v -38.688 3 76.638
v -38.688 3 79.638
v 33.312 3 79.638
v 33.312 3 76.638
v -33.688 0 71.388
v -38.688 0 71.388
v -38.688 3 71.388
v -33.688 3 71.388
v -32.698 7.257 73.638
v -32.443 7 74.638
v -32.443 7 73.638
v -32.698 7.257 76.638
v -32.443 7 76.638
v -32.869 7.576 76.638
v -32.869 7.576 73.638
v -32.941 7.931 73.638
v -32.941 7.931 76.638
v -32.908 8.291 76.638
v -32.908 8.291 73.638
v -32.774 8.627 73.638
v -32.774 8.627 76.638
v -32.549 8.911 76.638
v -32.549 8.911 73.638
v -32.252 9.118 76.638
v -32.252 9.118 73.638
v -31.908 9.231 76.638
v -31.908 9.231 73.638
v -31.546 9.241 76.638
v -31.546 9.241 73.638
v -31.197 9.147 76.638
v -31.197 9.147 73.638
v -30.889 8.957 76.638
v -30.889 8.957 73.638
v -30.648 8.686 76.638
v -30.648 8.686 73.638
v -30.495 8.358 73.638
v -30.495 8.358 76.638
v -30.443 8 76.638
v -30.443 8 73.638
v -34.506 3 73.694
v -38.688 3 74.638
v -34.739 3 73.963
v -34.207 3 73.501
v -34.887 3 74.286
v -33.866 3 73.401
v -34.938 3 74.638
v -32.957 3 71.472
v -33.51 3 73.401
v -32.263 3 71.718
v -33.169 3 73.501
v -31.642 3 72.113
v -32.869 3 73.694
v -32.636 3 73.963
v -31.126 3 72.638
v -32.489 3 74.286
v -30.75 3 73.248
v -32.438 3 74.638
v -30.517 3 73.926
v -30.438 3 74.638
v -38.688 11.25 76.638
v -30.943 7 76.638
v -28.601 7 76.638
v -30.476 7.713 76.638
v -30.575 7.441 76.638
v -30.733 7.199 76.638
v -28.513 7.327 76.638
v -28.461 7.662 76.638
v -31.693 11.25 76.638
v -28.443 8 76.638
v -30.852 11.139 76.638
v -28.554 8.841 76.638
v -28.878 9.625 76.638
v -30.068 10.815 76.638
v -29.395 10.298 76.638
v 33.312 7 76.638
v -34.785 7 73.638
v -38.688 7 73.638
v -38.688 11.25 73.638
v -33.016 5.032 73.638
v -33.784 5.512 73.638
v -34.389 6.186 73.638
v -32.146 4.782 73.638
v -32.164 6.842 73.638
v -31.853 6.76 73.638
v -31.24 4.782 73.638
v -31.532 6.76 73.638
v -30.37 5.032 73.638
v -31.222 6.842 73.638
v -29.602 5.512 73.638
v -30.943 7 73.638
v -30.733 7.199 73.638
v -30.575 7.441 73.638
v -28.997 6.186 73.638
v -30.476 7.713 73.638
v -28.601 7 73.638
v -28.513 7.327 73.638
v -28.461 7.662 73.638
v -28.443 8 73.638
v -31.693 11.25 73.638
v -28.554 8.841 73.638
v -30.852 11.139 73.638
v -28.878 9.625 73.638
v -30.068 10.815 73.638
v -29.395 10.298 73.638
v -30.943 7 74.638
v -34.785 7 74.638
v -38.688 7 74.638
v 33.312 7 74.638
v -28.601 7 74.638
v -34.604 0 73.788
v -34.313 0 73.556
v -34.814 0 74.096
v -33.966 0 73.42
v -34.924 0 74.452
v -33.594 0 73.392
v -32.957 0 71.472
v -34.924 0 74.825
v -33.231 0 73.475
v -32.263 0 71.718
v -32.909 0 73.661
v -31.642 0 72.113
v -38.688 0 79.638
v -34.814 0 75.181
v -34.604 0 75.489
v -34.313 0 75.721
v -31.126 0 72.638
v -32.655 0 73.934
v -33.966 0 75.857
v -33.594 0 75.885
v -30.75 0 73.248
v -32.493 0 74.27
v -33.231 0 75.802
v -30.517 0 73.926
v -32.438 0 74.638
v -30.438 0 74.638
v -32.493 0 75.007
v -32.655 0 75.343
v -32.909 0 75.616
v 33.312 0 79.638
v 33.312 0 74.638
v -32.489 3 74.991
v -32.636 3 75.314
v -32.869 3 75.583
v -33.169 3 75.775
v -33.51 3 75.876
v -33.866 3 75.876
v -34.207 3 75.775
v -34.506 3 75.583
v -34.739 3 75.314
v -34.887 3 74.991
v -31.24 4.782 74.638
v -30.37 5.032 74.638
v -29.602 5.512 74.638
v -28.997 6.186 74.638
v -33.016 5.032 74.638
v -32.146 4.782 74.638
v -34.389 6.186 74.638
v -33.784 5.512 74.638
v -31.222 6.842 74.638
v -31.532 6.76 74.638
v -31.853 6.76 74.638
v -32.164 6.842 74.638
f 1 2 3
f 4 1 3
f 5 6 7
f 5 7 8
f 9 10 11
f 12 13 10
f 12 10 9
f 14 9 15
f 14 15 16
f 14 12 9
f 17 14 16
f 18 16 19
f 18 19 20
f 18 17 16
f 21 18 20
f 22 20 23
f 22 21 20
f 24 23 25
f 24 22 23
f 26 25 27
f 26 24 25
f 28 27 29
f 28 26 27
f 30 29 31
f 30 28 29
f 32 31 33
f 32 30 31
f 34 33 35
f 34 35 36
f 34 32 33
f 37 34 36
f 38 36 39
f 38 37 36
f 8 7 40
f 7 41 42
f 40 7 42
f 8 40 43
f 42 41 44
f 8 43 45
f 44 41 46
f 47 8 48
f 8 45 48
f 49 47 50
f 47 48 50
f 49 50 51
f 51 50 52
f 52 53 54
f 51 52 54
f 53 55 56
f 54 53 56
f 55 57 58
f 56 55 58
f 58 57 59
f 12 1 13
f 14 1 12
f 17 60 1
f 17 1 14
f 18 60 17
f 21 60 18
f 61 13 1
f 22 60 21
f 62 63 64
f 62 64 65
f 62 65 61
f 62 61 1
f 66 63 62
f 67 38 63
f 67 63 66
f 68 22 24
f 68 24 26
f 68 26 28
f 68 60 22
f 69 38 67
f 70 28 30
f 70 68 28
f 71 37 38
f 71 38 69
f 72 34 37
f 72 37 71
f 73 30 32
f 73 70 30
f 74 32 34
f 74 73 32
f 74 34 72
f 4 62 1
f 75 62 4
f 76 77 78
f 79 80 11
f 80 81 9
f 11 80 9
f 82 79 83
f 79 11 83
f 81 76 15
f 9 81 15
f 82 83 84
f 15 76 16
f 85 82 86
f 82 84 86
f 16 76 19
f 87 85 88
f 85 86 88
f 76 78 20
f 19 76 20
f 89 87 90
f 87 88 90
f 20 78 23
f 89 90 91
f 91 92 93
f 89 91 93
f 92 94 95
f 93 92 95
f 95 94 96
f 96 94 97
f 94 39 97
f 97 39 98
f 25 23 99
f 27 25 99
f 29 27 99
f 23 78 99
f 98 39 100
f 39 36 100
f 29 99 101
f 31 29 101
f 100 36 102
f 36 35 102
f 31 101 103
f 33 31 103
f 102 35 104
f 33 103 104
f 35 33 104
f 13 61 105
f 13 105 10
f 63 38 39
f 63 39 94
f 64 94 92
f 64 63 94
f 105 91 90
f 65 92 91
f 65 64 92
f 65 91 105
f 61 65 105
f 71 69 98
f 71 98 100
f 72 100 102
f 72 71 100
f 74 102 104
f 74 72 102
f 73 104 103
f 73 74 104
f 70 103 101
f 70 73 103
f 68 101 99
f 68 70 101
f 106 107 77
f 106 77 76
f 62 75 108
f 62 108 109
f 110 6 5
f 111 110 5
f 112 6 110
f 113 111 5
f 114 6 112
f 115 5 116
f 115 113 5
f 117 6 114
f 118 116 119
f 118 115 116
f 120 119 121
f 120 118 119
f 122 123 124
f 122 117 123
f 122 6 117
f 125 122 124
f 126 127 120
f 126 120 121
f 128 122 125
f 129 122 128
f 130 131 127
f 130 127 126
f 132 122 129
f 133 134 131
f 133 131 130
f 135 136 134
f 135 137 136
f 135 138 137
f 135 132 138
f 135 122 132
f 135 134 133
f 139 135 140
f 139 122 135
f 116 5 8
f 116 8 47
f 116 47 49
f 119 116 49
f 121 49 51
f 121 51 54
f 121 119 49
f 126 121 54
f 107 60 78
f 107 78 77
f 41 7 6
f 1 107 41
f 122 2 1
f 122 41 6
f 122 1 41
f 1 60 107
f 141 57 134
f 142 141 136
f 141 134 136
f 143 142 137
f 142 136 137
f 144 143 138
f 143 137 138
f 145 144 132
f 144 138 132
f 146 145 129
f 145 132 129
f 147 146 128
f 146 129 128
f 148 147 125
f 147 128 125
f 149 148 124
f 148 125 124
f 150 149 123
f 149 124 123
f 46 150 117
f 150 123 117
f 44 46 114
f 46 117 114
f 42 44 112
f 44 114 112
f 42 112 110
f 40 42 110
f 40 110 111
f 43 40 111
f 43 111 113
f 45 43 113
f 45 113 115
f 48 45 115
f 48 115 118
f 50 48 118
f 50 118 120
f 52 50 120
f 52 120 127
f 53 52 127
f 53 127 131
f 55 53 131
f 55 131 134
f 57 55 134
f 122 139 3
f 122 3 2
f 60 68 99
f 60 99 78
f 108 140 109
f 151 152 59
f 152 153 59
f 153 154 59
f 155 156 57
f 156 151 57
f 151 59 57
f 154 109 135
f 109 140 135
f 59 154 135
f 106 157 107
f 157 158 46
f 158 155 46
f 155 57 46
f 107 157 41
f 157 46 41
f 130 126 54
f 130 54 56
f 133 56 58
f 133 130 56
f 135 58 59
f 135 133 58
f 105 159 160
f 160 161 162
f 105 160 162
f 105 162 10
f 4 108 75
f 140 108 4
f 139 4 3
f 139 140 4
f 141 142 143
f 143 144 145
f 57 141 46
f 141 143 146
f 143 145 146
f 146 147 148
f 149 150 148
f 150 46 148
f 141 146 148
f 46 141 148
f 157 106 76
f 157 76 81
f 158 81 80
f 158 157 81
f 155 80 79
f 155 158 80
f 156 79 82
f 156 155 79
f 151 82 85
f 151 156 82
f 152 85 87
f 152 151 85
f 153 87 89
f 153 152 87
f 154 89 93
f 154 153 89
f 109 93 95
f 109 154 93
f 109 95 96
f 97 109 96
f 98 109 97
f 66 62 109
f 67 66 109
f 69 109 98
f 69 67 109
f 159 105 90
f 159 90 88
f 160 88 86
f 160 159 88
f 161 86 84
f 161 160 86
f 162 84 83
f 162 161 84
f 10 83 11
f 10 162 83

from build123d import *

# Parameters (mm, degrees)
F0_R     = 1.25
F1_DEPTH = 3
F2_W     = 72
F2_H     = 2
F3_DEPTH = 4
F5_DEPTH = 3


with BuildPart() as f1:
    # F0 (on Front) → F1 (new body)
    with BuildSketch(Plane.XZ):
        with BuildLine():
            Line((33.312092313, 76.6384017421), (-25.687907687, 76.6384017421))
            Line((-25.687907687, 76.6384017421), (-31.1261699955, 76.6384017421))
            ThreePointArc((-31.1261699955, 76.6384017421), (-30.6147865133, 75.6959584788), (-30.437907687, 74.6384017421))
            Line((-30.437907687, 74.6384017421), (33.312092313, 74.6384017421))
            Line((33.312092313, 74.6384017421), (33.312092313, 76.6384017421))
        make_face()
        with BuildLine():
            ThreePointArc((-30.437907687, 74.6384017421), (-30.6147865133, 75.6959584788), (-31.1261699955, 76.6384017421))
            Line((-31.1261699955, 76.6384017421), (-36.2496453785, 76.6384017421))
            ThreePointArc((-36.2496453785, 76.6384017421), (-36.6087380484, 73.2131824607), (-33.687907687, 71.3884017421))
            ThreePointArc((-33.687907687, 71.3884017421), (-32.2626884057, 71.7175713807), (-31.1261699955, 72.6384017421))
            ThreePointArc((-31.1261699955, 72.6384017421), (-30.6147865133, 73.5808450054), (-30.437907687, 74.6384017421))
        make_face()
        with Locations((-33.687907687, 74.6384017421)):
            Circle(F0_R, mode=Mode.SUBTRACT)
        with BuildLine():
            ThreePointArc((-33.687907687, 71.3884017421), (-36.6087380484, 73.2131824607), (-36.2496453785, 76.6384017421))
            Line((-36.2496453785, 76.6384017421), (-38.687907687, 76.6384017421))
            Line((-38.687907687, 76.6384017421), (-38.687907687, 71.3884017421))
            Line((-38.687907687, 71.3884017421), (-33.687907687, 71.3884017421))
        make_face()
        with BuildLine():
            Line((-31.1261699955, 76.6384017421), (-25.687907687, 76.6384017421))
            Line((-25.687907687, 76.6384017421), (33.312092313, 76.6384017421))
            Line((33.312092313, 76.6384017421), (33.312092313, 79.6384017421))
            Line((33.312092313, 79.6384017421), (-38.687907687, 79.6384017421))
            Line((-38.687907687, 79.6384017421), (-38.687907687, 76.6384017421))
            Line((-38.687907687, 76.6384017421), (-36.2496453785, 76.6384017421))
            ThreePointArc((-36.2496453785, 76.6384017421), (-33.687907687, 77.8884017421), (-31.1261699955, 76.6384017421))
        make_face()
        with BuildLine():
            Line((-36.2496453785, 76.6384017421), (-31.1261699955, 76.6384017421))
            ThreePointArc((-31.1261699955, 76.6384017421), (-33.687907687, 77.8884017421), (-36.2496453785, 76.6384017421))
        make_face()
    extrude(amount=-F1_DEPTH)

    # F2 (on face) → F3 (join)
    with BuildSketch(Plane(origin=(0, 3, 0), x_dir=(-1, 0, 0), z_dir=(0, 1, 0))):
        with Locations((2.687907687, 75.6384017421)):
            Rectangle(F2_W, F2_H)
    extrude(amount=F3_DEPTH)

    # F4 (on face) → F5 (join)
    with BuildSketch(Plane.XY.offset(76.6384017421)):
        with BuildLine():
            Line((-38.687907687, 7), (-34.7851954552, 7))
            ThreePointArc((-34.7851954552, 7), (-34.3208407412, 9.9121323176), (-31.692866236, 11.25))
            Line((-31.692866236, 11.25), (-38.687907687, 11.25))
            Line((-38.687907687, 11.25), (-38.687907687, 7))
        make_face()
        with BuildLine():
            ThreePointArc((-32.442866236, 7), (-32.2518832303, 9.1180339887), (-30.442866236, 8))
            ThreePointArc((-30.442866236, 8), (-30.5748322472, 7.4409830056), (-30.942866236, 7))
            Line((-30.942866236, 7), (-28.6005370168, 7))
            ThreePointArc((-28.6005370168, 7), (-28.4825259143, 7.4938231349), (-28.442866236, 8))
            ThreePointArc((-28.442866236, 8), (-29.3947691971, 10.2980970389), (-31.692866236, 11.25))
            ThreePointArc((-31.692866236, 11.25), (-34.3208407412, 9.9121323176), (-34.7851954552, 7))
            Line((-34.7851954552, 7), (-32.442866236, 7))
        make_face()
        with BuildLine():
            ThreePointArc((-30.942866236, 7), (-31.692866236, 6.75), (-32.442866236, 7))
            Line((-32.442866236, 7), (-34.7851954552, 7))
            ThreePointArc((-34.7851954552, 7), (-31.692866236, 4.75), (-28.6005370168, 7))
            Line((-28.6005370168, 7), (-30.942866236, 7))
        make_face()
    extrude(amount=-F5_DEPTH)


solid = f1.part
